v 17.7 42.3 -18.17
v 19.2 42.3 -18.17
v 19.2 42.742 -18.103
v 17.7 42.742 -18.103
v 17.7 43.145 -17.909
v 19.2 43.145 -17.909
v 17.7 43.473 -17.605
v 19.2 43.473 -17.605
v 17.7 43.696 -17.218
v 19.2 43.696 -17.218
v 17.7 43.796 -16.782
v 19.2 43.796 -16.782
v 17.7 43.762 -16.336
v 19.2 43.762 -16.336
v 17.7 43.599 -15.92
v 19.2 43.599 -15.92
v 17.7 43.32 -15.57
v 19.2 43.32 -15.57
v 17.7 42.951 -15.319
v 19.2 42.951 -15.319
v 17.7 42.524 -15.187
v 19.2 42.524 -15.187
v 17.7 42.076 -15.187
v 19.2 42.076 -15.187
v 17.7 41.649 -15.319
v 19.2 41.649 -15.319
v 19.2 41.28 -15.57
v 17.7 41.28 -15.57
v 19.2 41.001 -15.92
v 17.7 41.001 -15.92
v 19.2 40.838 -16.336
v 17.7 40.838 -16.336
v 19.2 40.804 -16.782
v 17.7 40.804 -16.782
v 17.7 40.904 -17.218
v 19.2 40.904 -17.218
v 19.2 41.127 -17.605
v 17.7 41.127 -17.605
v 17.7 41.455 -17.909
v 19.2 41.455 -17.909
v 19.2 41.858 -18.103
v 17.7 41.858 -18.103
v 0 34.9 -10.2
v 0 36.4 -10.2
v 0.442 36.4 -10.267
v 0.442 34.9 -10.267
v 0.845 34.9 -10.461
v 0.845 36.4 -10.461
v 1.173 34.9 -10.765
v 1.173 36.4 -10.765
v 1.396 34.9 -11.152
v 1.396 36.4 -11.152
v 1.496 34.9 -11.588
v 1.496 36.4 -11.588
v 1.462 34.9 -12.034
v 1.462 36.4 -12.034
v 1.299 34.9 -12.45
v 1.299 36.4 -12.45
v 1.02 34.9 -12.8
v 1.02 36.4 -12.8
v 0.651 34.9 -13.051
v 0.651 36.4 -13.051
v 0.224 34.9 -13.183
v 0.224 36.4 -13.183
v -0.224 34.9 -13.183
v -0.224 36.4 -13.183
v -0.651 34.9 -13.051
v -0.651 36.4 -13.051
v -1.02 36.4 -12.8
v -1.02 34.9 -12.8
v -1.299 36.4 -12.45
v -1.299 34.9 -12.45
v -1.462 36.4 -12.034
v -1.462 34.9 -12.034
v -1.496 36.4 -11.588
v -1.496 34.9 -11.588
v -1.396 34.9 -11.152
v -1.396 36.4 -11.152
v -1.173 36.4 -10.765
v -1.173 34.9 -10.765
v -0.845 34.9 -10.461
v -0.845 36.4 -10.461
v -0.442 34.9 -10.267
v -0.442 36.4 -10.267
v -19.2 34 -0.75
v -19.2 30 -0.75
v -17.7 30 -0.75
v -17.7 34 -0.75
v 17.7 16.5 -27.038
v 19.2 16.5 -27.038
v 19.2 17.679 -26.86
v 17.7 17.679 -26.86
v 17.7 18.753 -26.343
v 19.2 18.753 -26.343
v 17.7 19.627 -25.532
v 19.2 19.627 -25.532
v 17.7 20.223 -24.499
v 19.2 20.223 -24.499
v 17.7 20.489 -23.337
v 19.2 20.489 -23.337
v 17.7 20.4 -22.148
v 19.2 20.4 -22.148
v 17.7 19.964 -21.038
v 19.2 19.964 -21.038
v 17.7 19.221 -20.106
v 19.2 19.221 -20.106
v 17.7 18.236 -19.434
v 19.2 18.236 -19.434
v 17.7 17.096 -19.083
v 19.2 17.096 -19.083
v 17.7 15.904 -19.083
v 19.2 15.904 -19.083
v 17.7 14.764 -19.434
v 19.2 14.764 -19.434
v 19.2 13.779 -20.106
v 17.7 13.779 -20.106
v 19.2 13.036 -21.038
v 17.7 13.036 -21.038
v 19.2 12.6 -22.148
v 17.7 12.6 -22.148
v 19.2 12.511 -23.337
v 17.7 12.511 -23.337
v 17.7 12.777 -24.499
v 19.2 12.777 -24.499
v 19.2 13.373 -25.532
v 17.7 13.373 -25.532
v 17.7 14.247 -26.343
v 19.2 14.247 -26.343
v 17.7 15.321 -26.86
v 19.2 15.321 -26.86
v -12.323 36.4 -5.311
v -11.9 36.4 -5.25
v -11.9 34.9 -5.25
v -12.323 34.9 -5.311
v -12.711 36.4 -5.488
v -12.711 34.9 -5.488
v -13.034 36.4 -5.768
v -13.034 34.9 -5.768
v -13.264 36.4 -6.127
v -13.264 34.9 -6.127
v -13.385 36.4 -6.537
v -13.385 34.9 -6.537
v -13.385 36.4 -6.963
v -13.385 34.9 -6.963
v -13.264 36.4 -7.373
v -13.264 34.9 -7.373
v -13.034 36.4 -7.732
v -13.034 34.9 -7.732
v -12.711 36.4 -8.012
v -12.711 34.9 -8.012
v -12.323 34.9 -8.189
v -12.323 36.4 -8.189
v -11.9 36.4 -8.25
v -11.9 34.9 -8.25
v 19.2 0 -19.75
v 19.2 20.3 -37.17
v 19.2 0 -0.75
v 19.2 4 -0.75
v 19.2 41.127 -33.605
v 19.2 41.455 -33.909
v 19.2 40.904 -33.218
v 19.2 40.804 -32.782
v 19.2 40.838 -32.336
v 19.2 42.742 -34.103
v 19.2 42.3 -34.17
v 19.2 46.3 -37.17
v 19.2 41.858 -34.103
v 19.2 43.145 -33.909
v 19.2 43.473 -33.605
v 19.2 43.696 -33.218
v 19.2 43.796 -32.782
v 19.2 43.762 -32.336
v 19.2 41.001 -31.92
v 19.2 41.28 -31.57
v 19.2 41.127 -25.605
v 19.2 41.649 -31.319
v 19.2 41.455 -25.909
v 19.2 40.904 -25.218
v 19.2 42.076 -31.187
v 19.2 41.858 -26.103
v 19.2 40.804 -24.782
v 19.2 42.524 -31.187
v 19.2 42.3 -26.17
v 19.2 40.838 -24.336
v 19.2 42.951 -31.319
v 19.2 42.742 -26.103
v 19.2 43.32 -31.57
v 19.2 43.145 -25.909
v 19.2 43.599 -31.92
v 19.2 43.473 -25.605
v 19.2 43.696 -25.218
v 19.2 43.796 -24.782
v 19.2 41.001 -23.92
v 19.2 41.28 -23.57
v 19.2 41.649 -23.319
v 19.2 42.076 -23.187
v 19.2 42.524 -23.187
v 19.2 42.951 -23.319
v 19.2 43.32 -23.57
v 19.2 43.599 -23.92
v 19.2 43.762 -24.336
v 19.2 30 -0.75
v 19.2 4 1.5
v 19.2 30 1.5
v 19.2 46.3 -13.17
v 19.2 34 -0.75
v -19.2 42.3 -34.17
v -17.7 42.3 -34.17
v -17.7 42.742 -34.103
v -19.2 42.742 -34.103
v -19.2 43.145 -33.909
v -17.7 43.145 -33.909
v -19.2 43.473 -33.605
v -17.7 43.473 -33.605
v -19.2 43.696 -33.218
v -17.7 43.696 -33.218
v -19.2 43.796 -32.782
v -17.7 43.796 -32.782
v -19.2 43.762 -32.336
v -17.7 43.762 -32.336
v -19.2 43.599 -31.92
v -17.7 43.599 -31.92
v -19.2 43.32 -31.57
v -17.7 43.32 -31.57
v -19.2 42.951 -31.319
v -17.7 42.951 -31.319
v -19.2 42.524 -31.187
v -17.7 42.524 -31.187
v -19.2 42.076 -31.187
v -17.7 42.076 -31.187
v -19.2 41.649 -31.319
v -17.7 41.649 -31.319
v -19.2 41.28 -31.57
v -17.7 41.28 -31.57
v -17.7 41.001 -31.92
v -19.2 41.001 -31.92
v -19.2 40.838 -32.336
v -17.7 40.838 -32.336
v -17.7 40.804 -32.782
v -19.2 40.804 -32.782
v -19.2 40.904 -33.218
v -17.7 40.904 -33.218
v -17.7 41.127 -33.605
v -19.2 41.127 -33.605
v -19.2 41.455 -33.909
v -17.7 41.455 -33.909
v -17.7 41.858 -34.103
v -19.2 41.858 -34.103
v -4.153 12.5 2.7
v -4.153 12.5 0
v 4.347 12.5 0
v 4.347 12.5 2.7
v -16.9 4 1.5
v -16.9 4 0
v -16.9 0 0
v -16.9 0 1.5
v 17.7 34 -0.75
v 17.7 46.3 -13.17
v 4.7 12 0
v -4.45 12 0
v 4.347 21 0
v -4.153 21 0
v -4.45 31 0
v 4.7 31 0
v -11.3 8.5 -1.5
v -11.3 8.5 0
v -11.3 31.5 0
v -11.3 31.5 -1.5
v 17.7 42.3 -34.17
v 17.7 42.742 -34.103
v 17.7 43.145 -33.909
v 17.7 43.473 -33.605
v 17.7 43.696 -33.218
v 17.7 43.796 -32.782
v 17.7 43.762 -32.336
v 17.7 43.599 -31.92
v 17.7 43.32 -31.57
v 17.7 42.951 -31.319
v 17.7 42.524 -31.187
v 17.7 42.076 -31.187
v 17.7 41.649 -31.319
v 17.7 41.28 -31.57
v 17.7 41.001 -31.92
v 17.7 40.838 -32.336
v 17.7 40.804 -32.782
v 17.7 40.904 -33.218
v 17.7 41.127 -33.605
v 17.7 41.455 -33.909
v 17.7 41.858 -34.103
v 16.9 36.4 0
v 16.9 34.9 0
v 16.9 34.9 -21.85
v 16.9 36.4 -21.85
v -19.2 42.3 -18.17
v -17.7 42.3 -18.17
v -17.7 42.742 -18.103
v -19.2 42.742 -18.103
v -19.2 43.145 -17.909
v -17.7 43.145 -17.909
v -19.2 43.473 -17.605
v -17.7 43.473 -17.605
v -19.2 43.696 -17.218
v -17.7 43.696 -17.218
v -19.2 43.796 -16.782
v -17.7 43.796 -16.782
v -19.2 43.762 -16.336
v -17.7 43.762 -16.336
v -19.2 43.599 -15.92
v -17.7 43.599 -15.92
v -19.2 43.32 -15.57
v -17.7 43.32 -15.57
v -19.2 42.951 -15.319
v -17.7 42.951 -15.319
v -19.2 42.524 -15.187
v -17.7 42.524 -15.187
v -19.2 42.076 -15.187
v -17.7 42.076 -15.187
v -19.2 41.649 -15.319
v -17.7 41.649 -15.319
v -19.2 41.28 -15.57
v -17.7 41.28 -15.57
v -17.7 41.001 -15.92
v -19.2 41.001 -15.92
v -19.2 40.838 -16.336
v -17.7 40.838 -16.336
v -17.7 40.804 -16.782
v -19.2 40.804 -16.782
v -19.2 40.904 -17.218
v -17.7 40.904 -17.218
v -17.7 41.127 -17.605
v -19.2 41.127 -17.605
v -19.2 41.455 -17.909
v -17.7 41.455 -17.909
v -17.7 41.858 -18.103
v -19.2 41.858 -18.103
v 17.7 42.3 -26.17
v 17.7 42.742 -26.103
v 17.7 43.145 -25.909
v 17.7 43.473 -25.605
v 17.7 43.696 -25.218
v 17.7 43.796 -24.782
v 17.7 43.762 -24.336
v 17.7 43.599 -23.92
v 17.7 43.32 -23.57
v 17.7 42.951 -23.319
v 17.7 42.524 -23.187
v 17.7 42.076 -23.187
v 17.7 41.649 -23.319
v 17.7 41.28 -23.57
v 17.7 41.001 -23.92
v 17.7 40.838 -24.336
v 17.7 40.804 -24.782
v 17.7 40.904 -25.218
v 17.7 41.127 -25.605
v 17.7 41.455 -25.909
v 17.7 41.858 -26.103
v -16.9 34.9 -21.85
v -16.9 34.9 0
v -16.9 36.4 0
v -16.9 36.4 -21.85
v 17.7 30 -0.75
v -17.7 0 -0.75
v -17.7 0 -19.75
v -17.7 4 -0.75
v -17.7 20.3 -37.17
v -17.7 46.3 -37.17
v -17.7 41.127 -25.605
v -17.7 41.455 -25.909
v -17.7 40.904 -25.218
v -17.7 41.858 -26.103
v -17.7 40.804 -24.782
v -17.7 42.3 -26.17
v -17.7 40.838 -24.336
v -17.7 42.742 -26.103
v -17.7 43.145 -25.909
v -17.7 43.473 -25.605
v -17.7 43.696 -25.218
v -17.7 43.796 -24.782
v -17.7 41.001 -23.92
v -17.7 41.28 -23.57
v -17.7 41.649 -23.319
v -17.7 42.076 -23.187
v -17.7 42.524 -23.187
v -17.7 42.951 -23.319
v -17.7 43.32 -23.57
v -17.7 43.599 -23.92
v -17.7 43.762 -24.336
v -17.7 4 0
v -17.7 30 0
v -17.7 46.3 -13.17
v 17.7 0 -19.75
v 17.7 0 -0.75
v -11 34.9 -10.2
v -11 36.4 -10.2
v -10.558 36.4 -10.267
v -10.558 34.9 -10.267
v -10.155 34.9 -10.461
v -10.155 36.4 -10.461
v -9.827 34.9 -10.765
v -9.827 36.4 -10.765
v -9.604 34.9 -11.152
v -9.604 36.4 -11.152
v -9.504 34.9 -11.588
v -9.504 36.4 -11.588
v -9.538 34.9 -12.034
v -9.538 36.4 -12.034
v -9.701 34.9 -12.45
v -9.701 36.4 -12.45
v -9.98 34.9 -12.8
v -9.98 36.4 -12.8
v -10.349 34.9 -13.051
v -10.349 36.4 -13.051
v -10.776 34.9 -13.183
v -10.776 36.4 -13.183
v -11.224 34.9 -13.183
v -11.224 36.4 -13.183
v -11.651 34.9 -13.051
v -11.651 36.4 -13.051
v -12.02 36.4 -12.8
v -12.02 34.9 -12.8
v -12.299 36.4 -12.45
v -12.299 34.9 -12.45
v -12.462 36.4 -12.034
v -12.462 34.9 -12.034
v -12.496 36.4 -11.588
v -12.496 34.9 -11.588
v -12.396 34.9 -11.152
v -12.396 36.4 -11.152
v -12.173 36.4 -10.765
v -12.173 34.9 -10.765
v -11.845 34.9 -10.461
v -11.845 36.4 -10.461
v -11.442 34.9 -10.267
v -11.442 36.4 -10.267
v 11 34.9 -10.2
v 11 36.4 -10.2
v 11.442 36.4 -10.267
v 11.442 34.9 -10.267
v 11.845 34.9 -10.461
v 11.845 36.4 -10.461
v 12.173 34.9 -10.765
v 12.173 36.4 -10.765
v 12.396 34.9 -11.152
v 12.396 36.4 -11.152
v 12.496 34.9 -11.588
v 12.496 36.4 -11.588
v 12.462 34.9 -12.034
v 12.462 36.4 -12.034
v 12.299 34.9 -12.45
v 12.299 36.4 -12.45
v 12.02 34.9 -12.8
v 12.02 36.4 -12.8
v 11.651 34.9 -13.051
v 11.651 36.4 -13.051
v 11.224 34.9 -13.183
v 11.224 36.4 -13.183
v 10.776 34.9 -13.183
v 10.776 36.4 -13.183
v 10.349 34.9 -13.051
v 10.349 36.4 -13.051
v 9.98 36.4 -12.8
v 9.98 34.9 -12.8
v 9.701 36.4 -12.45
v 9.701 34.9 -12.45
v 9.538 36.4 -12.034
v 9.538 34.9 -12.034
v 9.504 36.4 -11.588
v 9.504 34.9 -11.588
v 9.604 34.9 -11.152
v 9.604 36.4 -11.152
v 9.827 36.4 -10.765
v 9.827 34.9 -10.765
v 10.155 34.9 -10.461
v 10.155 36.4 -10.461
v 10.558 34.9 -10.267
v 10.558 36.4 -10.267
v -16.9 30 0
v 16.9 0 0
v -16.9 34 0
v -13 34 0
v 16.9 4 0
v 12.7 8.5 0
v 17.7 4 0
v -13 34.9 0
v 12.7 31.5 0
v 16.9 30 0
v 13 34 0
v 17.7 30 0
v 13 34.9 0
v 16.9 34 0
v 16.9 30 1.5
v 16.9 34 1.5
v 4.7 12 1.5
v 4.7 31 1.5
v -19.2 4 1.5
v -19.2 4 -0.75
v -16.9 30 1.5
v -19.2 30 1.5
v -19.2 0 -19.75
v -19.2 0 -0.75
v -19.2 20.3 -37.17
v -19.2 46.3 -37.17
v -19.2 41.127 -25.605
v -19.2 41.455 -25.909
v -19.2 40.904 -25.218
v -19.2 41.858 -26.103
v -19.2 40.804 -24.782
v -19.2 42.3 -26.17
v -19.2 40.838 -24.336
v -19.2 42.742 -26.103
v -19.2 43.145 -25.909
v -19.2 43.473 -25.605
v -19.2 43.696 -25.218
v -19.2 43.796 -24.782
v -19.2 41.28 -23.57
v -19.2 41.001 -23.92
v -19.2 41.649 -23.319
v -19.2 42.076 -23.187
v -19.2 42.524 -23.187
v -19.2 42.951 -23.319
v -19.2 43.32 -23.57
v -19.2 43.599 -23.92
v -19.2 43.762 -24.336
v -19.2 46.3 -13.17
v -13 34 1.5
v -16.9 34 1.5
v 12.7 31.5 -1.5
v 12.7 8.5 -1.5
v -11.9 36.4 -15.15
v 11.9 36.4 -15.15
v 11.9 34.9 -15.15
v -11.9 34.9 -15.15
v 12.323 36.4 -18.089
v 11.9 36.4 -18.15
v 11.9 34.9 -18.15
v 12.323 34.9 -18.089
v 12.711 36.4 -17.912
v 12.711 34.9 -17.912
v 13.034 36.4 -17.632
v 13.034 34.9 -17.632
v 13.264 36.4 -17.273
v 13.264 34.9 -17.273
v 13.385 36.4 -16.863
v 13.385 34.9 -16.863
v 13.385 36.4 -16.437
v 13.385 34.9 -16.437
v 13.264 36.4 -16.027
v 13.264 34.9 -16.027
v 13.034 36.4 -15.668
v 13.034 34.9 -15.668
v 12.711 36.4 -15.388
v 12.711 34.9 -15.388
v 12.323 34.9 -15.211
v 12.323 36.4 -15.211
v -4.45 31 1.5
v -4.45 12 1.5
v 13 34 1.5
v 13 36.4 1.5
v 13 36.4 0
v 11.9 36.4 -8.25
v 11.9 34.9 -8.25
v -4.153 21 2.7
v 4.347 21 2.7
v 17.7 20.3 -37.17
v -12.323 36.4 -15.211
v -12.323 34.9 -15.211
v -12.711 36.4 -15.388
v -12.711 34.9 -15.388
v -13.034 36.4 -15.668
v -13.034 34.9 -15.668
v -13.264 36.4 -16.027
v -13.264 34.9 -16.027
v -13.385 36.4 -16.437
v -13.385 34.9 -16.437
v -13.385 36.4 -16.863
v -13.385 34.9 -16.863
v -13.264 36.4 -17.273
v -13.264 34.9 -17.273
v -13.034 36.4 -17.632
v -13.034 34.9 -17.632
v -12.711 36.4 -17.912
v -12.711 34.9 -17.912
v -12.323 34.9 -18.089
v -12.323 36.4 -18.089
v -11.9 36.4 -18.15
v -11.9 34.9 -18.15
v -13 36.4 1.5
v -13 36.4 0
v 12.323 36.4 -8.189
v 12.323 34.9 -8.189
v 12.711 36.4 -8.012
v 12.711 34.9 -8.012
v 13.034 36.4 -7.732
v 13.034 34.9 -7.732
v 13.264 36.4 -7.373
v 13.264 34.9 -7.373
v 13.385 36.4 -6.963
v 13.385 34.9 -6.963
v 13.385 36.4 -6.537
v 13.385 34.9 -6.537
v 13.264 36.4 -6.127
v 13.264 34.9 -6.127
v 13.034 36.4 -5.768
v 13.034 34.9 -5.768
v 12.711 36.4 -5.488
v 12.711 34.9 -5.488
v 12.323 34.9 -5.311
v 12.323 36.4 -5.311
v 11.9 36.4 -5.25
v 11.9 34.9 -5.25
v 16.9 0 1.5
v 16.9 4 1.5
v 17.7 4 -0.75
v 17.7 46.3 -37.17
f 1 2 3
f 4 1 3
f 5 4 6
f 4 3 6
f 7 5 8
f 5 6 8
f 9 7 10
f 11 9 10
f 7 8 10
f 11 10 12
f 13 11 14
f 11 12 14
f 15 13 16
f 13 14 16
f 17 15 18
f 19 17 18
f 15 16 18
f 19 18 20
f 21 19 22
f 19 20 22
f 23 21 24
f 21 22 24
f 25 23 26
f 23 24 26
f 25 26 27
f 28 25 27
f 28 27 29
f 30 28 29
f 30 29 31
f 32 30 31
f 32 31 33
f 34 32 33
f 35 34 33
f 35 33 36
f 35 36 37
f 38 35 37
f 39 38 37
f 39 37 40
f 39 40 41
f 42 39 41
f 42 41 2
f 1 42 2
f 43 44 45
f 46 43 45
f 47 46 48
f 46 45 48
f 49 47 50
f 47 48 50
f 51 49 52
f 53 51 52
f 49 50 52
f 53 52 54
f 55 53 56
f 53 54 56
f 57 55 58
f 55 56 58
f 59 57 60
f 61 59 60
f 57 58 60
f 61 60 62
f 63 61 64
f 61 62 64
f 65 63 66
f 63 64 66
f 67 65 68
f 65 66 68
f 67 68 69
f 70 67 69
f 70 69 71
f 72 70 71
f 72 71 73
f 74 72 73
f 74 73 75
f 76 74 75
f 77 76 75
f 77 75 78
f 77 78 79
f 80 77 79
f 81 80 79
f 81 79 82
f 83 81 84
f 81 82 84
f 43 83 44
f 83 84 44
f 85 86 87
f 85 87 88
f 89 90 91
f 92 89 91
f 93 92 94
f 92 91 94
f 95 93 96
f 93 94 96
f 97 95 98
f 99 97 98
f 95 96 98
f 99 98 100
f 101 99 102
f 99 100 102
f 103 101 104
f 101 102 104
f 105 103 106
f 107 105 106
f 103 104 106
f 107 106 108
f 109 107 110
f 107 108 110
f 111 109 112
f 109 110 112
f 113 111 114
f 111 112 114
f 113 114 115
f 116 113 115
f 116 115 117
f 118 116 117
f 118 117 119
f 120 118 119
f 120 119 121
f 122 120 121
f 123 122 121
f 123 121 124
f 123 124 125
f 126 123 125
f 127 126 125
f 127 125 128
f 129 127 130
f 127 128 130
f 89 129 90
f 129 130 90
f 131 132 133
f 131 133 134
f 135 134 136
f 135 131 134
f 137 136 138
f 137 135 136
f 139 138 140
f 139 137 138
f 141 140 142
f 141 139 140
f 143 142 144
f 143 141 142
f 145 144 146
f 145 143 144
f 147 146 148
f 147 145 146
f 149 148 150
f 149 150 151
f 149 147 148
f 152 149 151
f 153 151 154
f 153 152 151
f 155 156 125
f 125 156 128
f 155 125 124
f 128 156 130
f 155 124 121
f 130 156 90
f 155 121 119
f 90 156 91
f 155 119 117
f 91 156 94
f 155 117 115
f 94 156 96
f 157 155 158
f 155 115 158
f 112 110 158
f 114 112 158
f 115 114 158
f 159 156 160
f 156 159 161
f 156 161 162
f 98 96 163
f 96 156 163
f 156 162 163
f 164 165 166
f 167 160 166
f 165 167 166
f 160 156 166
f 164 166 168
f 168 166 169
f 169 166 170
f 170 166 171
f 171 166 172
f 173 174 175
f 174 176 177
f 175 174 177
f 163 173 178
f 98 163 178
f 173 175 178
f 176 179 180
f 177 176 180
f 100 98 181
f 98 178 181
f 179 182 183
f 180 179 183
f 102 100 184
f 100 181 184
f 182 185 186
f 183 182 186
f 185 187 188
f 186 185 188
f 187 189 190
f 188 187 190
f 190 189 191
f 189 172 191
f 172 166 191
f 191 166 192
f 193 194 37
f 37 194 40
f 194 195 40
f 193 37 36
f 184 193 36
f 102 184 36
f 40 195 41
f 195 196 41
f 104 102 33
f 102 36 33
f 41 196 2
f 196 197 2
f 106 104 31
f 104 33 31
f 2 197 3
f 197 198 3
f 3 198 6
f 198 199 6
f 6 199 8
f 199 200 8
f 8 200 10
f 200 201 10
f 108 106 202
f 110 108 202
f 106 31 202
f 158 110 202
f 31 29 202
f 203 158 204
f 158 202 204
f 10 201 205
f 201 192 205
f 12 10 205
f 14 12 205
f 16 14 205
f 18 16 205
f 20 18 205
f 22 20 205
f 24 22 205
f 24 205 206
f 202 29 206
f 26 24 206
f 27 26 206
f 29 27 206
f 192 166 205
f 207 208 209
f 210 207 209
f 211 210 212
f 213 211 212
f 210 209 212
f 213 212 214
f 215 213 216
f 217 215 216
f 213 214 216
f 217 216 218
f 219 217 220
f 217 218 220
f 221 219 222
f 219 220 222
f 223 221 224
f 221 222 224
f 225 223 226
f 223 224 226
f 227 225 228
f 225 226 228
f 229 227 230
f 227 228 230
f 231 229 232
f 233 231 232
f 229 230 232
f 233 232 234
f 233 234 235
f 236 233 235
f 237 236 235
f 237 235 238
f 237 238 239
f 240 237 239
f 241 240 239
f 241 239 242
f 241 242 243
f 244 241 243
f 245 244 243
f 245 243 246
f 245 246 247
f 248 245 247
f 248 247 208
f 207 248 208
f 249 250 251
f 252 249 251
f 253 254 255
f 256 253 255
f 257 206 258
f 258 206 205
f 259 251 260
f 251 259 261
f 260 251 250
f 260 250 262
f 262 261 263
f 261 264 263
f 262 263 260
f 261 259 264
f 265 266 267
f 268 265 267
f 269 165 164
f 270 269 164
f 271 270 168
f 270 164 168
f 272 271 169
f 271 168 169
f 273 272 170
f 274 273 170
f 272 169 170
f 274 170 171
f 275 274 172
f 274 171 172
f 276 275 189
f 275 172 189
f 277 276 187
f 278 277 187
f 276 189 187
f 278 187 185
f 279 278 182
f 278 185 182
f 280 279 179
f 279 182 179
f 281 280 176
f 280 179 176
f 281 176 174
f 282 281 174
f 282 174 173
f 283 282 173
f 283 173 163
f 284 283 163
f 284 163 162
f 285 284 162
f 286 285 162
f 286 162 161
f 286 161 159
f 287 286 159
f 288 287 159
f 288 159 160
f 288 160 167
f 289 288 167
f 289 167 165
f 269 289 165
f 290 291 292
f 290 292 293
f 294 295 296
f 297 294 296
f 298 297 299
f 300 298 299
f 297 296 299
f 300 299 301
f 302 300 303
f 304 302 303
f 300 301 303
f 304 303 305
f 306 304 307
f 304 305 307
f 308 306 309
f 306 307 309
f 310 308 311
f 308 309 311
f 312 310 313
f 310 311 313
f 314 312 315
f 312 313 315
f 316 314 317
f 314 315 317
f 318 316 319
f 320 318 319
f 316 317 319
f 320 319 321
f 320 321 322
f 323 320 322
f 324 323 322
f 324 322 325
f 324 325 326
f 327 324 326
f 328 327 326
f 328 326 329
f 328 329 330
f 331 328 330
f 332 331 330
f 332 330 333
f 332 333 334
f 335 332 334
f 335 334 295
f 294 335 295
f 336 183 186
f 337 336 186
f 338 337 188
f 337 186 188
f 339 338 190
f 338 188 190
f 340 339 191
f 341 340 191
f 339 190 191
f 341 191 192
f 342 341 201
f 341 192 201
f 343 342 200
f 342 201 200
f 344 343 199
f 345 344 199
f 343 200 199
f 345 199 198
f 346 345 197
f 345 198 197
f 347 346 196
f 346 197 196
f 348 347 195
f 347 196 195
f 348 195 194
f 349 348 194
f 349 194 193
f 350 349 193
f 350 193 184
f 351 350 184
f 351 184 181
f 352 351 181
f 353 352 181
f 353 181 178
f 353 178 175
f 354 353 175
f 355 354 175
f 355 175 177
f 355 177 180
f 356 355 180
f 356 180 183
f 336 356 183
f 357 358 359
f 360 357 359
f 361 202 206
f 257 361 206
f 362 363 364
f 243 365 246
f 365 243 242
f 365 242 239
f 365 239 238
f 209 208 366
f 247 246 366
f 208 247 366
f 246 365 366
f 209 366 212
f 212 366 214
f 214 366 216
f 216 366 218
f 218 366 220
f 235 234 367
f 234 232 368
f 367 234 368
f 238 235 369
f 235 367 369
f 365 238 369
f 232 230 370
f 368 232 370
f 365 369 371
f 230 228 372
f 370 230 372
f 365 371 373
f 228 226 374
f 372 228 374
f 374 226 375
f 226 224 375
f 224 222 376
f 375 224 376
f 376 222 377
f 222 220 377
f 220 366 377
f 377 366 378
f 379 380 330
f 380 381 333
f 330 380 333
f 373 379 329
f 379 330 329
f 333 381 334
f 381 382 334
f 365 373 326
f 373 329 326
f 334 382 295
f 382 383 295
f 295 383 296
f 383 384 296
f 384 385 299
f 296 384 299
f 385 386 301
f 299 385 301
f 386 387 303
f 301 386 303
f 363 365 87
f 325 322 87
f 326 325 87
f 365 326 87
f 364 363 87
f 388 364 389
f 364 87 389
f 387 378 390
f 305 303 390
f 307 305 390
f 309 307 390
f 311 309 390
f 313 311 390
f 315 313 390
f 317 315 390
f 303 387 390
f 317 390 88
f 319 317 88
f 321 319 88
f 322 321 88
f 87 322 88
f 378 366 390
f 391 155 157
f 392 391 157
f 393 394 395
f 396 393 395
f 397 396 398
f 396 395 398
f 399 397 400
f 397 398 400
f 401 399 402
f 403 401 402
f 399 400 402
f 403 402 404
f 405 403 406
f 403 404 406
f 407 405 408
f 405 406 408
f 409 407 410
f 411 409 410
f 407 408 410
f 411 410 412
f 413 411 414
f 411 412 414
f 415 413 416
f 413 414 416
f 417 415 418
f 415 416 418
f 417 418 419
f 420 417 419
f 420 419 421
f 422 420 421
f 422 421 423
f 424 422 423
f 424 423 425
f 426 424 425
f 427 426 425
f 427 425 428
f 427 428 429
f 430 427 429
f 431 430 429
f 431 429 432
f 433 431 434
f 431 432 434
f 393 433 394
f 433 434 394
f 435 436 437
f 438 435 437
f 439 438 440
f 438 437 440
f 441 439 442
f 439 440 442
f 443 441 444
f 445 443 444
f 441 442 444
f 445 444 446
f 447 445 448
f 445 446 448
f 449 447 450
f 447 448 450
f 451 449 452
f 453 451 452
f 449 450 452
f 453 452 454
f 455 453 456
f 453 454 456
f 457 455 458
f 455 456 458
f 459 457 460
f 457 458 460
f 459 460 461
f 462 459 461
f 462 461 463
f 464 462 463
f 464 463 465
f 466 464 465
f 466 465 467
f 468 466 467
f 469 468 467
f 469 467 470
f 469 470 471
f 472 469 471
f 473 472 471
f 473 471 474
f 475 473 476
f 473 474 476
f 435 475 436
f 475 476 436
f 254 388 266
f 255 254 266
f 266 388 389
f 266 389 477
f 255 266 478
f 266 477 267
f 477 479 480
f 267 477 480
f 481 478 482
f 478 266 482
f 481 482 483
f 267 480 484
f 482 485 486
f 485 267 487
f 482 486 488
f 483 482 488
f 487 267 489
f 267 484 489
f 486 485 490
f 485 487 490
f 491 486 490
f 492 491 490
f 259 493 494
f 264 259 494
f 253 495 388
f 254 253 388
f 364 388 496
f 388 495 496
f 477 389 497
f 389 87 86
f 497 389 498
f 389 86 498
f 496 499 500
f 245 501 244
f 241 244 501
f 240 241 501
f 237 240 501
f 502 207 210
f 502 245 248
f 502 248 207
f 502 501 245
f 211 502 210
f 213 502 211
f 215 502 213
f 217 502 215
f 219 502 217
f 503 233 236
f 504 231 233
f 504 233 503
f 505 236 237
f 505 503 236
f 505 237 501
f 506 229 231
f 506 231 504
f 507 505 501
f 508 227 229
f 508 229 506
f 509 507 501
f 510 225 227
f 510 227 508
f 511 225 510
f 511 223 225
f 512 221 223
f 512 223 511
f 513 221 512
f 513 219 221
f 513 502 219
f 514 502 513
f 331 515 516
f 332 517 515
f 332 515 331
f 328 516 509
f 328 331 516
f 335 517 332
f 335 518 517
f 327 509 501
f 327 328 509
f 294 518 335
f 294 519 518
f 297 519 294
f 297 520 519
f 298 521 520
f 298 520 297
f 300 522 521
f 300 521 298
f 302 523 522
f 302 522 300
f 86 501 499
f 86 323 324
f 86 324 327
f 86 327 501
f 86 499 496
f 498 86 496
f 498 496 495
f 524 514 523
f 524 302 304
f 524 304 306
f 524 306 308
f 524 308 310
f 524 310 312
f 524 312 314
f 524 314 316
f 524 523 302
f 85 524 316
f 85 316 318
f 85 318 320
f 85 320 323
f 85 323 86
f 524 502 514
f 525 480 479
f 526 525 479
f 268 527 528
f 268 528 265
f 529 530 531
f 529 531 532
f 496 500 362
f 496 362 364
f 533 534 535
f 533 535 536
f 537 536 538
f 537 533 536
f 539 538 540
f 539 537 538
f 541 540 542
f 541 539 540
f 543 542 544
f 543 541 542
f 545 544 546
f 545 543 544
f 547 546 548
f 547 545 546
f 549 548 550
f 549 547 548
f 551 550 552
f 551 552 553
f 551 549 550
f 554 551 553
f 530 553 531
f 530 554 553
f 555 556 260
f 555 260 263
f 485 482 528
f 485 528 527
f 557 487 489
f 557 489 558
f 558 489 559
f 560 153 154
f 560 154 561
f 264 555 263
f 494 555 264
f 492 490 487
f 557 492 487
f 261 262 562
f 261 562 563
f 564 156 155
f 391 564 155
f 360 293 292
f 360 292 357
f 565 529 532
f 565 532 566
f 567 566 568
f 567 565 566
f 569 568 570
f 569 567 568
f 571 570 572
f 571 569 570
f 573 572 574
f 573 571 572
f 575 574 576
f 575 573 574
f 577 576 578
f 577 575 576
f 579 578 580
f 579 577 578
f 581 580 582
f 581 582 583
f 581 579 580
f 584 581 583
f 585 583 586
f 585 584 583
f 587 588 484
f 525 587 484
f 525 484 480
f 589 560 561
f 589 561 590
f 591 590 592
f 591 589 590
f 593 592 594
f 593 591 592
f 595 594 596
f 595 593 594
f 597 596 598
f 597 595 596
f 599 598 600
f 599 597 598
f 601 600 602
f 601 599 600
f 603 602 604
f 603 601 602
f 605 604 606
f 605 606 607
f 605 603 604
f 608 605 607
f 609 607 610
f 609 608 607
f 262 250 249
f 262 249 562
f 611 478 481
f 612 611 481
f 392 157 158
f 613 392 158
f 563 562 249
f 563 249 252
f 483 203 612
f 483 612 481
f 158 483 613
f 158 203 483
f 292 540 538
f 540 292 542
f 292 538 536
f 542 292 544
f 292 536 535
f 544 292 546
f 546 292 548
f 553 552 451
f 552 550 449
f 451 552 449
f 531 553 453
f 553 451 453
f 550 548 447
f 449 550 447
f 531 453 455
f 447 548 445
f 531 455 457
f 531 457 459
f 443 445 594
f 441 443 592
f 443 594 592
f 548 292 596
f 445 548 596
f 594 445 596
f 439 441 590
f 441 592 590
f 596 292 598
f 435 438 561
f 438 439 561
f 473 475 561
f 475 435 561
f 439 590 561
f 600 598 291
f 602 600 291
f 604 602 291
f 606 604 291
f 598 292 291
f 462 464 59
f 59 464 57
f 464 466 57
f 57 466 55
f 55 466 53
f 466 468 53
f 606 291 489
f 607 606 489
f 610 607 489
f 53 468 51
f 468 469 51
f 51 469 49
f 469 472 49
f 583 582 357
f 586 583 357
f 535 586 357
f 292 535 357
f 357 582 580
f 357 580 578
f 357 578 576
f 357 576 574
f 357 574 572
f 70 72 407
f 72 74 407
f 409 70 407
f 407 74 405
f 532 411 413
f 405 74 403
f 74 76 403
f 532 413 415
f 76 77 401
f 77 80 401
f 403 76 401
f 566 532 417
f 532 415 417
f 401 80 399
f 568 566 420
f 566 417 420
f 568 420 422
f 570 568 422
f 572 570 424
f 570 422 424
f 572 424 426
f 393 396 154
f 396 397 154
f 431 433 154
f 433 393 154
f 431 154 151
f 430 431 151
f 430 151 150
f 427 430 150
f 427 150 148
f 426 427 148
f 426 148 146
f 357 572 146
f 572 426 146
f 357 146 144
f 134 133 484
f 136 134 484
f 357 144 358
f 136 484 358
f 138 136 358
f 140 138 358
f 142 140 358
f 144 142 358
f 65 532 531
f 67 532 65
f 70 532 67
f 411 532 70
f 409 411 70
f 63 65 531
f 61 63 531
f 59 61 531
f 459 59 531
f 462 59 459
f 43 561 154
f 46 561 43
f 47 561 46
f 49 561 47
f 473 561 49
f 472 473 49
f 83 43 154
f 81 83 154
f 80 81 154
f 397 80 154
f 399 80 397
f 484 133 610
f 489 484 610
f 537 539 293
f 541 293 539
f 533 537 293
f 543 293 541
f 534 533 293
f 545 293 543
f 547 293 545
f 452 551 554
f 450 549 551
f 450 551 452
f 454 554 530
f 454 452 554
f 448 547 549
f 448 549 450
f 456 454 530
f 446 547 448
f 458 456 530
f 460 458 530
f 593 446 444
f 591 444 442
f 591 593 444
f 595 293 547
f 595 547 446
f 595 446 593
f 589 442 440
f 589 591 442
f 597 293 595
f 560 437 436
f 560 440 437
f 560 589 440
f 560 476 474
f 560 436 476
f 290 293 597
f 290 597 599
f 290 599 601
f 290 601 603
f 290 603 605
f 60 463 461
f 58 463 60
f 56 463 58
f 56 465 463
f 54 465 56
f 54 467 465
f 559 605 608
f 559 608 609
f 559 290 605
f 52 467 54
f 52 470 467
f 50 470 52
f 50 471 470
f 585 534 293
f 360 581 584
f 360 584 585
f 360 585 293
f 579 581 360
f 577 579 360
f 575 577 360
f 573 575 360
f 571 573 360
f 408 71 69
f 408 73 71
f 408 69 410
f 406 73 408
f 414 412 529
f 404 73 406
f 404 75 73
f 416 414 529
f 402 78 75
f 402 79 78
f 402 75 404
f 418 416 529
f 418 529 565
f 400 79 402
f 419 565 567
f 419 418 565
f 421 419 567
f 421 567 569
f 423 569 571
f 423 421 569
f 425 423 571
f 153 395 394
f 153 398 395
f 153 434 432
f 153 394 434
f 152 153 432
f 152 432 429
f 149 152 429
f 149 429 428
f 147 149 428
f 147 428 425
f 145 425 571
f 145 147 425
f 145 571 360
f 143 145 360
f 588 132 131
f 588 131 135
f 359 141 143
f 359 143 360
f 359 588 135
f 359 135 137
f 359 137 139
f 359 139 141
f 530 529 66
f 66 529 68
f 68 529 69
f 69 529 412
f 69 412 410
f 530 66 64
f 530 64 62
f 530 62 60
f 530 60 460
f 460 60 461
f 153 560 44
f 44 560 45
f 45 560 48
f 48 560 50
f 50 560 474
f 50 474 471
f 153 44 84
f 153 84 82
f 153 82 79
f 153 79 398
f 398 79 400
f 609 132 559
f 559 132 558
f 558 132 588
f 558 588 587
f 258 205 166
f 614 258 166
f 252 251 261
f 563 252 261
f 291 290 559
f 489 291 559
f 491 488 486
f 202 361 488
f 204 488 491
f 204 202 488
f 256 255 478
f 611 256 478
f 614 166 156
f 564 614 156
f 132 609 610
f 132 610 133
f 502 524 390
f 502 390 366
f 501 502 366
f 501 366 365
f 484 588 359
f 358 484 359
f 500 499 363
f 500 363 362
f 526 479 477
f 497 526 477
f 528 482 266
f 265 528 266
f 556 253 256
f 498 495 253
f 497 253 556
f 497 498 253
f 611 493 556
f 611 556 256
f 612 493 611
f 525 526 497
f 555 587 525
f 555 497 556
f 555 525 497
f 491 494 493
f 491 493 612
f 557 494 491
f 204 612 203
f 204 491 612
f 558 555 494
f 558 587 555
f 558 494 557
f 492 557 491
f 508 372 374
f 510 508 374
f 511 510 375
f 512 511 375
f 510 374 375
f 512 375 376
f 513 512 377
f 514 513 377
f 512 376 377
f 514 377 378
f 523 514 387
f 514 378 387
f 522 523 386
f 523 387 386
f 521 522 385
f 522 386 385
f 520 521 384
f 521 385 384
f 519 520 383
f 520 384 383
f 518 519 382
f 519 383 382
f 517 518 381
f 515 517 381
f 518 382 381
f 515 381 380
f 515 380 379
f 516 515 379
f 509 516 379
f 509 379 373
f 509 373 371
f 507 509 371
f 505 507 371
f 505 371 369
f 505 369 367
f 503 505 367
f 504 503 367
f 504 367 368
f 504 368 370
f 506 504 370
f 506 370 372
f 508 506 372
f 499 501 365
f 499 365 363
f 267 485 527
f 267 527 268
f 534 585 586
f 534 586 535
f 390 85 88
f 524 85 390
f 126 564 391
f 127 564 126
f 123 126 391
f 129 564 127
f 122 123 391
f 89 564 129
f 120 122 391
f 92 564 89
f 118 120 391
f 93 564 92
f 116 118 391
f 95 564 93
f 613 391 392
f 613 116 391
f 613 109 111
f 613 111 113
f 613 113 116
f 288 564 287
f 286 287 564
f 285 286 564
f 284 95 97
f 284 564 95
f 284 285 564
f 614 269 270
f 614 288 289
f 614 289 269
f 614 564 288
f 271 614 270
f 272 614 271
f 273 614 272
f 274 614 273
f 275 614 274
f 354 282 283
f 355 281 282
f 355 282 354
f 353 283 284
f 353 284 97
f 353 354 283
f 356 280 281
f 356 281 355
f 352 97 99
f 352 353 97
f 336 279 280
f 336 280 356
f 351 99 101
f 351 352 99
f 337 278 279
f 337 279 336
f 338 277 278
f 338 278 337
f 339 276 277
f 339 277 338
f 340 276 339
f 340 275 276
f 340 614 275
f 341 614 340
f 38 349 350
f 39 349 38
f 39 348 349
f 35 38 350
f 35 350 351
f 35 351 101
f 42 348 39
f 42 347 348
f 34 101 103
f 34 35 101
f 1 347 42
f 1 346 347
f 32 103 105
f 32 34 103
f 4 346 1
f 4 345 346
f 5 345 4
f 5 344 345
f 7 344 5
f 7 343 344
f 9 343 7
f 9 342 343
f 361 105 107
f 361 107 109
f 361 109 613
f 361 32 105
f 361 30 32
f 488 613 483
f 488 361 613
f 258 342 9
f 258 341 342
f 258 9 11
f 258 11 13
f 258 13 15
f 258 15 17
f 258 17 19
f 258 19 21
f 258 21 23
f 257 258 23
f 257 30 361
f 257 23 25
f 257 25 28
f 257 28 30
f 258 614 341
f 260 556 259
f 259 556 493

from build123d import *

# Parameters (mm, degrees)
BOSS_EXTRUDE1_DEPTH = 1.5
SKETCH3_W           = 9.15
SKETCH3_H           = 19
CUT_EXTRUDE1_DEPTH  = 1.5
SKETCH2_W           = 33.8
SKETCH2_H           = 1.5
BOSS_EXTRUDE2_DEPTH = 21.85
SKETCH4_R           = 1.5
CUT_EXTRUDE2_DEPTH  = 1.5
BOSS_EXTRUDE3_DEPTH = 1.5
CUT_EXTRUDE4_REACH  = 72.71
SKETCH6_R           = 1.5
SKETCH6_3_R         = 4
CUT_EXTRUDE5_DEPTH  = 1.5
SKETCH8_W           = 24
SKETCH8_H           = 23
BOSS_EXTRUDE5_DEPTH = 1.5
SKETCH9_W           = 8.5
SKETCH9_H           = 8.5
BOSS_EXTRUDE6_DEPTH = 2.7


with BuildPart() as part:
    # Sketch1 → Boss-Extrude1 (new body)
    with BuildSketch(Plane.XY):
        Polygon((-16.9, 0), (16.9, 0), (16.9, 4), (19.2, 4), (19.2, 30), (16.9, 30), (16.9, 34), (13, 34), (13, 36.4), (-13, 36.4), (-13, 34), (-16.9, 34), (-16.9, 30), (-19.2, 30), (-19.2, 4), (-16.9, 4), align=None)
    extrude(amount=BOSS_EXTRUDE1_DEPTH)

    # Sketch3 → Cut-Extrude1 (cut)
    with BuildSketch(Plane.XY.offset(1.5)):
        with Locations((0.125, 21.5)):
            Rectangle(SKETCH3_W, SKETCH3_H)
    extrude(amount=-CUT_EXTRUDE1_DEPTH, mode=Mode.SUBTRACT)

    # Sketch2 → Boss-Extrude2 (add)
    with BuildSketch(Plane(origin=(0, 0, 0), x_dir=(-1, 0, 0), z_dir=(0, 0, -1))):
        with Locations((0, 35.65)):
            Rectangle(SKETCH2_W, SKETCH2_H)
    extrude(amount=BOSS_EXTRUDE2_DEPTH)

    # Sketch4 → Cut-Extrude2 (cut)
    with BuildSketch(Plane(origin=(0, 36.4, 0), x_dir=(1, 0, 0), z_dir=(0, 1, 0))):
        with Locations(Location((-11, 11.7, 0), (0, 0, 270))):
            Circle(SKETCH4_R)
        with Locations(Location((0, 11.7, 0), (0, 0, 270))):
            Circle(SKETCH4_R)
        with Locations(Location((11, 11.7, 0), (0, 0, 270))):
            Circle(SKETCH4_R)
        with BuildLine():
            Line((-11.9, 8.25), (11.9, 8.25))
            ThreePointArc((11.9, 8.25), (13.4, 6.75), (11.9, 5.25))
            Line((11.9, 5.25), (-11.9, 5.25))
            ThreePointArc((-11.9, 5.25), (-13.4, 6.75), (-11.9, 8.25))
        make_face()
        with BuildLine():
            Line((-11.9, 18.15), (11.9, 18.15))
            ThreePointArc((11.9, 18.15), (13.4, 16.65), (11.9, 15.15))
            Line((11.9, 15.15), (-11.9, 15.15))
            ThreePointArc((-11.9, 15.15), (-13.4, 16.65), (-11.9, 18.15))
        make_face()
    extrude(amount=-CUT_EXTRUDE2_DEPTH, mode=Mode.SUBTRACT)

    # Sketch5 → Boss-Extrude3 (add)
    with BuildSketch(Plane(origin=(19.2, 0, 0), x_dir=(0, 0, -1), z_dir=(1, 0, 0))):
        Polygon((0, 30), (0.75, 30), (0.75, 34), (13.17, 46.3), (37.17, 46.3), (37.17, 20.3), (19.75, 0), (0.75, 0), (0.75, 4), (0, 4), (-1.5, 4), (-1.5, 30), align=None)
    boss_extrude3 = extrude(amount=-BOSS_EXTRUDE3_DEPTH)

    # Mirror1: Boss-Extrude3 across plane
    add(boss_extrude3.mirror(Plane(origin=(0, 0, 0), x_dir=(0, 0, 1), z_dir=(1, 0, 0))))

    # Cut-Extrude4: up to this face of the body (flat: up to its plane)
    cut_extrude4_end = Plane(part.part.faces().sort_by_distance((-19.2, 23.875362989, -17.45186466))[0])
    # Sketch6 → Cut-Extrude4 (cut, up to the picked face)
    with BuildSketch(Plane(origin=(19.2, 0, 0), x_dir=(0, 0, -1), z_dir=(1, 0, 0)), mode=Mode.PRIVATE) as cut_extrude4_sk1:
        with Locations((16.67, 42.3)):
            Circle(SKETCH6_R)
    cut_extrude4_tool1 = split(extrude(cut_extrude4_sk1.sketch, amount=-CUT_EXTRUDE4_REACH, mode=Mode.PRIVATE), bisect_by=cut_extrude4_end, keep=Keep.BOTH, mode=Mode.PRIVATE)
    # Sketch6 → Cut-Extrude4 (cut, up to the picked face)
    with BuildSketch(Plane(origin=(19.2, 0, 0), x_dir=(0, 0, -1), z_dir=(1, 0, 0)), mode=Mode.PRIVATE) as cut_extrude4_sk2:
        with Locations((24.67, 42.3)):
            Circle(SKETCH6_R)
    cut_extrude4_tool2 = split(extrude(cut_extrude4_sk2.sketch, amount=-CUT_EXTRUDE4_REACH, mode=Mode.PRIVATE), bisect_by=cut_extrude4_end, keep=Keep.BOTH, mode=Mode.PRIVATE)
    # Sketch6 → Cut-Extrude4 (cut, up to the picked face)
    with BuildSketch(Plane(origin=(19.2, 0, 0), x_dir=(0, 0, -1), z_dir=(1, 0, 0)), mode=Mode.PRIVATE) as cut_extrude4_sk3:
        with Locations((32.67, 42.3)):
            Circle(SKETCH6_R)
    cut_extrude4_tool3 = split(extrude(cut_extrude4_sk3.sketch, amount=-CUT_EXTRUDE4_REACH, mode=Mode.PRIVATE), bisect_by=cut_extrude4_end, keep=Keep.BOTH, mode=Mode.PRIVATE)
    add(cut_extrude4_tool1.solids().sort_by(Axis((19.2, 42.3, -16.67), (-1, 0, 0)))[0], mode=Mode.SUBTRACT)
    add(cut_extrude4_tool2.solids().sort_by(Axis((19.2, 42.3, -24.67), (-1, 0, 0)))[0], mode=Mode.SUBTRACT)
    add(cut_extrude4_tool3.solids().sort_by(Axis((19.2, 42.3, -32.67), (-1, 0, 0)))[0], mode=Mode.SUBTRACT)

    # Sketch6<3> → Cut-Extrude5 (cut)
    with BuildSketch(Plane(origin=(19.2, 0, 0), x_dir=(0, 0, -1), z_dir=(1, 0, 0))):
        with Locations((23.037930183, 16.5)):
            Circle(SKETCH6_3_R)
    extrude(amount=-CUT_EXTRUDE5_DEPTH, mode=Mode.SUBTRACT)

    # Sketch8 → Boss-Extrude5 (add)
    with BuildSketch(Plane(origin=(0, 0, 0), x_dir=(-1, 0, 0), z_dir=(0, 0, -1))):
        with Locations((-0.7, 20)):
            Rectangle(SKETCH8_W, SKETCH8_H)
    extrude(amount=BOSS_EXTRUDE5_DEPTH)

    # Sketch9 → Boss-Extrude6 (add)
    with BuildSketch(Plane.XY):
        with Locations((0.097336639, 16.75)):
            Rectangle(SKETCH9_W, SKETCH9_H)
    extrude(amount=BOSS_EXTRUDE6_DEPTH)


solid = part.part
